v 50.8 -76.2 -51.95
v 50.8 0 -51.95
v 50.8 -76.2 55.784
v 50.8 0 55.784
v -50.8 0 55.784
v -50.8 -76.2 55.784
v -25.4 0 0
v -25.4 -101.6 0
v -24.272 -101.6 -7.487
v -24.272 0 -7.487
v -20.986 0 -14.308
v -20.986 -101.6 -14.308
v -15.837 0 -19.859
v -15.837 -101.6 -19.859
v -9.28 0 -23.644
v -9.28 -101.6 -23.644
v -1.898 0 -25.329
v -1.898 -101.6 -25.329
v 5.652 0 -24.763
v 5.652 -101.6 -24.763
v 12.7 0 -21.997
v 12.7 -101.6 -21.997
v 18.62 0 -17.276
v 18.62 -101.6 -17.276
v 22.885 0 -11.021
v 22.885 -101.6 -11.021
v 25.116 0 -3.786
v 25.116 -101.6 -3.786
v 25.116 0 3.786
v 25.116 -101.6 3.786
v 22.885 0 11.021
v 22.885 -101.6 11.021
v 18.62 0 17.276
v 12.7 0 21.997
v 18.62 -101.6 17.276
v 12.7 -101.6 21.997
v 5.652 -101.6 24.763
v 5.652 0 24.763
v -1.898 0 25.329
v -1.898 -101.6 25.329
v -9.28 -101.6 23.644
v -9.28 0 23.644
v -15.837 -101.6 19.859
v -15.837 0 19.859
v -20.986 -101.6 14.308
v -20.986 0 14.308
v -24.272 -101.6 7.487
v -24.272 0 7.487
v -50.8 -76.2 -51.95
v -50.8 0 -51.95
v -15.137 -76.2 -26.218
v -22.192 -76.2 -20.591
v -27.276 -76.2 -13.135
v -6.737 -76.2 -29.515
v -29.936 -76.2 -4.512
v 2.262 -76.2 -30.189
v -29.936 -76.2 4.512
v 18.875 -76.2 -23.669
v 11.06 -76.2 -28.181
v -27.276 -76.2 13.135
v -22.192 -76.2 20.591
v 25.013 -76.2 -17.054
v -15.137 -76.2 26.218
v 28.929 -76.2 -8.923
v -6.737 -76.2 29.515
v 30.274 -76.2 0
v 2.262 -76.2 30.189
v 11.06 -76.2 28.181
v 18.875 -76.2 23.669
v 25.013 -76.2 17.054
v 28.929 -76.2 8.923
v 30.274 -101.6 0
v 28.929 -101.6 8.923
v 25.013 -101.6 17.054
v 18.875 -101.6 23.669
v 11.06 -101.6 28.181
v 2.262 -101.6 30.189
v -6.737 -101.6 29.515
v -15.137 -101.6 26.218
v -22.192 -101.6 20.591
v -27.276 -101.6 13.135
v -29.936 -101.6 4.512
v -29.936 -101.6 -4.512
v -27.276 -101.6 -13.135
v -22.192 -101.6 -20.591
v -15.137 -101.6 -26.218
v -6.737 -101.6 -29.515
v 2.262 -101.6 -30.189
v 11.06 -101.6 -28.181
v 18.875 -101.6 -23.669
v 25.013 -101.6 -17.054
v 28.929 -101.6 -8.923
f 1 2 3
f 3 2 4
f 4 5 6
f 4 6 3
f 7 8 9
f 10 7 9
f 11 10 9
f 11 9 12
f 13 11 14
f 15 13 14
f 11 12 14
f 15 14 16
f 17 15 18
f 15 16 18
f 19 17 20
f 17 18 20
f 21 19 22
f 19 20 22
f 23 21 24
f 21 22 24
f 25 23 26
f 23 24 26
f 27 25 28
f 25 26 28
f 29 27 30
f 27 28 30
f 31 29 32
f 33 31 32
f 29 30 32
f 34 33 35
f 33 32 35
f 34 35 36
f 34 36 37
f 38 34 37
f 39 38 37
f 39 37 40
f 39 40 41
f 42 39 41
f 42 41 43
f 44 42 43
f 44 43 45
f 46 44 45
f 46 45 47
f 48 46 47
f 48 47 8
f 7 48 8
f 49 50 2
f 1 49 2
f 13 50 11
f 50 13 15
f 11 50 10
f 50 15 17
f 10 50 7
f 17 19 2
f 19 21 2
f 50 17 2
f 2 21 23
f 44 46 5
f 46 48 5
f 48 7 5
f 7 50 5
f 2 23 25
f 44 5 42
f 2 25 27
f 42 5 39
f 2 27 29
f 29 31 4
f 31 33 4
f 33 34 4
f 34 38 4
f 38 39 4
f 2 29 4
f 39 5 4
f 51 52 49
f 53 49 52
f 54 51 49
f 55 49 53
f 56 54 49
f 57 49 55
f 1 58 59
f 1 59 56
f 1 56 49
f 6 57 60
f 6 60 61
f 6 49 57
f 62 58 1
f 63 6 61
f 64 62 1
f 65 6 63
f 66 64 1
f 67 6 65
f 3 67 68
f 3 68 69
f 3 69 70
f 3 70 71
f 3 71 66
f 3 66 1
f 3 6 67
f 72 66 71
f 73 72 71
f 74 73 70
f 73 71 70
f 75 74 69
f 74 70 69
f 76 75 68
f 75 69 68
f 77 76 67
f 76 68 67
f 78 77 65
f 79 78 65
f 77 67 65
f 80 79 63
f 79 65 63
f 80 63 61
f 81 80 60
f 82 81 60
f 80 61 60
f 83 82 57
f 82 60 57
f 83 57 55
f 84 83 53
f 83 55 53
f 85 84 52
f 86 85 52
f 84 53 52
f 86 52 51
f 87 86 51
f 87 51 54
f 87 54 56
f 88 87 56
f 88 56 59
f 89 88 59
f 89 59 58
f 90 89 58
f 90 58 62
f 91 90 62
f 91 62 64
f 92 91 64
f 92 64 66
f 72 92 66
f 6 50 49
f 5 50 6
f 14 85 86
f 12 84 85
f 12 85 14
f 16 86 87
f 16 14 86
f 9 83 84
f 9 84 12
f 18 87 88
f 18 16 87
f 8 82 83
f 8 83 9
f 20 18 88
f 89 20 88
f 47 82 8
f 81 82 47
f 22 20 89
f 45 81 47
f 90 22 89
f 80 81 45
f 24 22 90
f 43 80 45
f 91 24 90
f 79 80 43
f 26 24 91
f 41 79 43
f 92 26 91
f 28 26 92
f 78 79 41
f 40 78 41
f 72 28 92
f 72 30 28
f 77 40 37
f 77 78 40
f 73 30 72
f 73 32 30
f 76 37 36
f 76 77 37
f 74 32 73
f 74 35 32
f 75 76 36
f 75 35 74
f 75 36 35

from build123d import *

# Parameters (mm, degrees)
F0_W     = 101.6
F0_H     = 107.734338
F0_R     = 24.735745
F2_DEPTH = 76.2
F1_R     = 30.273775
F3_DEPTH = 101.6
F5_D     = 50.8


with BuildPart() as f2:
    # F0 (on Front) → F2 (new body)
    with BuildSketch(Plane.XZ):
        with Locations((0, 1.91698)):
            Rectangle(F0_W, F0_H)
        Circle(F0_R, mode=Mode.SUBTRACT)
    extrude(amount=F2_DEPTH)

    # F1 (on Front) → F3 (join)
    with BuildSketch(Plane.XZ):
        Circle(F1_R)
    extrude(amount=F3_DEPTH)

    # F5 (through all)
    with Locations(Plane(origin=(0, 0, 0), x_dir=(1, 0, 0), z_dir=(0, 1, 0))):
        with Locations((0, 0)):
            Hole(F5_D / 2)


solid = f2.part
